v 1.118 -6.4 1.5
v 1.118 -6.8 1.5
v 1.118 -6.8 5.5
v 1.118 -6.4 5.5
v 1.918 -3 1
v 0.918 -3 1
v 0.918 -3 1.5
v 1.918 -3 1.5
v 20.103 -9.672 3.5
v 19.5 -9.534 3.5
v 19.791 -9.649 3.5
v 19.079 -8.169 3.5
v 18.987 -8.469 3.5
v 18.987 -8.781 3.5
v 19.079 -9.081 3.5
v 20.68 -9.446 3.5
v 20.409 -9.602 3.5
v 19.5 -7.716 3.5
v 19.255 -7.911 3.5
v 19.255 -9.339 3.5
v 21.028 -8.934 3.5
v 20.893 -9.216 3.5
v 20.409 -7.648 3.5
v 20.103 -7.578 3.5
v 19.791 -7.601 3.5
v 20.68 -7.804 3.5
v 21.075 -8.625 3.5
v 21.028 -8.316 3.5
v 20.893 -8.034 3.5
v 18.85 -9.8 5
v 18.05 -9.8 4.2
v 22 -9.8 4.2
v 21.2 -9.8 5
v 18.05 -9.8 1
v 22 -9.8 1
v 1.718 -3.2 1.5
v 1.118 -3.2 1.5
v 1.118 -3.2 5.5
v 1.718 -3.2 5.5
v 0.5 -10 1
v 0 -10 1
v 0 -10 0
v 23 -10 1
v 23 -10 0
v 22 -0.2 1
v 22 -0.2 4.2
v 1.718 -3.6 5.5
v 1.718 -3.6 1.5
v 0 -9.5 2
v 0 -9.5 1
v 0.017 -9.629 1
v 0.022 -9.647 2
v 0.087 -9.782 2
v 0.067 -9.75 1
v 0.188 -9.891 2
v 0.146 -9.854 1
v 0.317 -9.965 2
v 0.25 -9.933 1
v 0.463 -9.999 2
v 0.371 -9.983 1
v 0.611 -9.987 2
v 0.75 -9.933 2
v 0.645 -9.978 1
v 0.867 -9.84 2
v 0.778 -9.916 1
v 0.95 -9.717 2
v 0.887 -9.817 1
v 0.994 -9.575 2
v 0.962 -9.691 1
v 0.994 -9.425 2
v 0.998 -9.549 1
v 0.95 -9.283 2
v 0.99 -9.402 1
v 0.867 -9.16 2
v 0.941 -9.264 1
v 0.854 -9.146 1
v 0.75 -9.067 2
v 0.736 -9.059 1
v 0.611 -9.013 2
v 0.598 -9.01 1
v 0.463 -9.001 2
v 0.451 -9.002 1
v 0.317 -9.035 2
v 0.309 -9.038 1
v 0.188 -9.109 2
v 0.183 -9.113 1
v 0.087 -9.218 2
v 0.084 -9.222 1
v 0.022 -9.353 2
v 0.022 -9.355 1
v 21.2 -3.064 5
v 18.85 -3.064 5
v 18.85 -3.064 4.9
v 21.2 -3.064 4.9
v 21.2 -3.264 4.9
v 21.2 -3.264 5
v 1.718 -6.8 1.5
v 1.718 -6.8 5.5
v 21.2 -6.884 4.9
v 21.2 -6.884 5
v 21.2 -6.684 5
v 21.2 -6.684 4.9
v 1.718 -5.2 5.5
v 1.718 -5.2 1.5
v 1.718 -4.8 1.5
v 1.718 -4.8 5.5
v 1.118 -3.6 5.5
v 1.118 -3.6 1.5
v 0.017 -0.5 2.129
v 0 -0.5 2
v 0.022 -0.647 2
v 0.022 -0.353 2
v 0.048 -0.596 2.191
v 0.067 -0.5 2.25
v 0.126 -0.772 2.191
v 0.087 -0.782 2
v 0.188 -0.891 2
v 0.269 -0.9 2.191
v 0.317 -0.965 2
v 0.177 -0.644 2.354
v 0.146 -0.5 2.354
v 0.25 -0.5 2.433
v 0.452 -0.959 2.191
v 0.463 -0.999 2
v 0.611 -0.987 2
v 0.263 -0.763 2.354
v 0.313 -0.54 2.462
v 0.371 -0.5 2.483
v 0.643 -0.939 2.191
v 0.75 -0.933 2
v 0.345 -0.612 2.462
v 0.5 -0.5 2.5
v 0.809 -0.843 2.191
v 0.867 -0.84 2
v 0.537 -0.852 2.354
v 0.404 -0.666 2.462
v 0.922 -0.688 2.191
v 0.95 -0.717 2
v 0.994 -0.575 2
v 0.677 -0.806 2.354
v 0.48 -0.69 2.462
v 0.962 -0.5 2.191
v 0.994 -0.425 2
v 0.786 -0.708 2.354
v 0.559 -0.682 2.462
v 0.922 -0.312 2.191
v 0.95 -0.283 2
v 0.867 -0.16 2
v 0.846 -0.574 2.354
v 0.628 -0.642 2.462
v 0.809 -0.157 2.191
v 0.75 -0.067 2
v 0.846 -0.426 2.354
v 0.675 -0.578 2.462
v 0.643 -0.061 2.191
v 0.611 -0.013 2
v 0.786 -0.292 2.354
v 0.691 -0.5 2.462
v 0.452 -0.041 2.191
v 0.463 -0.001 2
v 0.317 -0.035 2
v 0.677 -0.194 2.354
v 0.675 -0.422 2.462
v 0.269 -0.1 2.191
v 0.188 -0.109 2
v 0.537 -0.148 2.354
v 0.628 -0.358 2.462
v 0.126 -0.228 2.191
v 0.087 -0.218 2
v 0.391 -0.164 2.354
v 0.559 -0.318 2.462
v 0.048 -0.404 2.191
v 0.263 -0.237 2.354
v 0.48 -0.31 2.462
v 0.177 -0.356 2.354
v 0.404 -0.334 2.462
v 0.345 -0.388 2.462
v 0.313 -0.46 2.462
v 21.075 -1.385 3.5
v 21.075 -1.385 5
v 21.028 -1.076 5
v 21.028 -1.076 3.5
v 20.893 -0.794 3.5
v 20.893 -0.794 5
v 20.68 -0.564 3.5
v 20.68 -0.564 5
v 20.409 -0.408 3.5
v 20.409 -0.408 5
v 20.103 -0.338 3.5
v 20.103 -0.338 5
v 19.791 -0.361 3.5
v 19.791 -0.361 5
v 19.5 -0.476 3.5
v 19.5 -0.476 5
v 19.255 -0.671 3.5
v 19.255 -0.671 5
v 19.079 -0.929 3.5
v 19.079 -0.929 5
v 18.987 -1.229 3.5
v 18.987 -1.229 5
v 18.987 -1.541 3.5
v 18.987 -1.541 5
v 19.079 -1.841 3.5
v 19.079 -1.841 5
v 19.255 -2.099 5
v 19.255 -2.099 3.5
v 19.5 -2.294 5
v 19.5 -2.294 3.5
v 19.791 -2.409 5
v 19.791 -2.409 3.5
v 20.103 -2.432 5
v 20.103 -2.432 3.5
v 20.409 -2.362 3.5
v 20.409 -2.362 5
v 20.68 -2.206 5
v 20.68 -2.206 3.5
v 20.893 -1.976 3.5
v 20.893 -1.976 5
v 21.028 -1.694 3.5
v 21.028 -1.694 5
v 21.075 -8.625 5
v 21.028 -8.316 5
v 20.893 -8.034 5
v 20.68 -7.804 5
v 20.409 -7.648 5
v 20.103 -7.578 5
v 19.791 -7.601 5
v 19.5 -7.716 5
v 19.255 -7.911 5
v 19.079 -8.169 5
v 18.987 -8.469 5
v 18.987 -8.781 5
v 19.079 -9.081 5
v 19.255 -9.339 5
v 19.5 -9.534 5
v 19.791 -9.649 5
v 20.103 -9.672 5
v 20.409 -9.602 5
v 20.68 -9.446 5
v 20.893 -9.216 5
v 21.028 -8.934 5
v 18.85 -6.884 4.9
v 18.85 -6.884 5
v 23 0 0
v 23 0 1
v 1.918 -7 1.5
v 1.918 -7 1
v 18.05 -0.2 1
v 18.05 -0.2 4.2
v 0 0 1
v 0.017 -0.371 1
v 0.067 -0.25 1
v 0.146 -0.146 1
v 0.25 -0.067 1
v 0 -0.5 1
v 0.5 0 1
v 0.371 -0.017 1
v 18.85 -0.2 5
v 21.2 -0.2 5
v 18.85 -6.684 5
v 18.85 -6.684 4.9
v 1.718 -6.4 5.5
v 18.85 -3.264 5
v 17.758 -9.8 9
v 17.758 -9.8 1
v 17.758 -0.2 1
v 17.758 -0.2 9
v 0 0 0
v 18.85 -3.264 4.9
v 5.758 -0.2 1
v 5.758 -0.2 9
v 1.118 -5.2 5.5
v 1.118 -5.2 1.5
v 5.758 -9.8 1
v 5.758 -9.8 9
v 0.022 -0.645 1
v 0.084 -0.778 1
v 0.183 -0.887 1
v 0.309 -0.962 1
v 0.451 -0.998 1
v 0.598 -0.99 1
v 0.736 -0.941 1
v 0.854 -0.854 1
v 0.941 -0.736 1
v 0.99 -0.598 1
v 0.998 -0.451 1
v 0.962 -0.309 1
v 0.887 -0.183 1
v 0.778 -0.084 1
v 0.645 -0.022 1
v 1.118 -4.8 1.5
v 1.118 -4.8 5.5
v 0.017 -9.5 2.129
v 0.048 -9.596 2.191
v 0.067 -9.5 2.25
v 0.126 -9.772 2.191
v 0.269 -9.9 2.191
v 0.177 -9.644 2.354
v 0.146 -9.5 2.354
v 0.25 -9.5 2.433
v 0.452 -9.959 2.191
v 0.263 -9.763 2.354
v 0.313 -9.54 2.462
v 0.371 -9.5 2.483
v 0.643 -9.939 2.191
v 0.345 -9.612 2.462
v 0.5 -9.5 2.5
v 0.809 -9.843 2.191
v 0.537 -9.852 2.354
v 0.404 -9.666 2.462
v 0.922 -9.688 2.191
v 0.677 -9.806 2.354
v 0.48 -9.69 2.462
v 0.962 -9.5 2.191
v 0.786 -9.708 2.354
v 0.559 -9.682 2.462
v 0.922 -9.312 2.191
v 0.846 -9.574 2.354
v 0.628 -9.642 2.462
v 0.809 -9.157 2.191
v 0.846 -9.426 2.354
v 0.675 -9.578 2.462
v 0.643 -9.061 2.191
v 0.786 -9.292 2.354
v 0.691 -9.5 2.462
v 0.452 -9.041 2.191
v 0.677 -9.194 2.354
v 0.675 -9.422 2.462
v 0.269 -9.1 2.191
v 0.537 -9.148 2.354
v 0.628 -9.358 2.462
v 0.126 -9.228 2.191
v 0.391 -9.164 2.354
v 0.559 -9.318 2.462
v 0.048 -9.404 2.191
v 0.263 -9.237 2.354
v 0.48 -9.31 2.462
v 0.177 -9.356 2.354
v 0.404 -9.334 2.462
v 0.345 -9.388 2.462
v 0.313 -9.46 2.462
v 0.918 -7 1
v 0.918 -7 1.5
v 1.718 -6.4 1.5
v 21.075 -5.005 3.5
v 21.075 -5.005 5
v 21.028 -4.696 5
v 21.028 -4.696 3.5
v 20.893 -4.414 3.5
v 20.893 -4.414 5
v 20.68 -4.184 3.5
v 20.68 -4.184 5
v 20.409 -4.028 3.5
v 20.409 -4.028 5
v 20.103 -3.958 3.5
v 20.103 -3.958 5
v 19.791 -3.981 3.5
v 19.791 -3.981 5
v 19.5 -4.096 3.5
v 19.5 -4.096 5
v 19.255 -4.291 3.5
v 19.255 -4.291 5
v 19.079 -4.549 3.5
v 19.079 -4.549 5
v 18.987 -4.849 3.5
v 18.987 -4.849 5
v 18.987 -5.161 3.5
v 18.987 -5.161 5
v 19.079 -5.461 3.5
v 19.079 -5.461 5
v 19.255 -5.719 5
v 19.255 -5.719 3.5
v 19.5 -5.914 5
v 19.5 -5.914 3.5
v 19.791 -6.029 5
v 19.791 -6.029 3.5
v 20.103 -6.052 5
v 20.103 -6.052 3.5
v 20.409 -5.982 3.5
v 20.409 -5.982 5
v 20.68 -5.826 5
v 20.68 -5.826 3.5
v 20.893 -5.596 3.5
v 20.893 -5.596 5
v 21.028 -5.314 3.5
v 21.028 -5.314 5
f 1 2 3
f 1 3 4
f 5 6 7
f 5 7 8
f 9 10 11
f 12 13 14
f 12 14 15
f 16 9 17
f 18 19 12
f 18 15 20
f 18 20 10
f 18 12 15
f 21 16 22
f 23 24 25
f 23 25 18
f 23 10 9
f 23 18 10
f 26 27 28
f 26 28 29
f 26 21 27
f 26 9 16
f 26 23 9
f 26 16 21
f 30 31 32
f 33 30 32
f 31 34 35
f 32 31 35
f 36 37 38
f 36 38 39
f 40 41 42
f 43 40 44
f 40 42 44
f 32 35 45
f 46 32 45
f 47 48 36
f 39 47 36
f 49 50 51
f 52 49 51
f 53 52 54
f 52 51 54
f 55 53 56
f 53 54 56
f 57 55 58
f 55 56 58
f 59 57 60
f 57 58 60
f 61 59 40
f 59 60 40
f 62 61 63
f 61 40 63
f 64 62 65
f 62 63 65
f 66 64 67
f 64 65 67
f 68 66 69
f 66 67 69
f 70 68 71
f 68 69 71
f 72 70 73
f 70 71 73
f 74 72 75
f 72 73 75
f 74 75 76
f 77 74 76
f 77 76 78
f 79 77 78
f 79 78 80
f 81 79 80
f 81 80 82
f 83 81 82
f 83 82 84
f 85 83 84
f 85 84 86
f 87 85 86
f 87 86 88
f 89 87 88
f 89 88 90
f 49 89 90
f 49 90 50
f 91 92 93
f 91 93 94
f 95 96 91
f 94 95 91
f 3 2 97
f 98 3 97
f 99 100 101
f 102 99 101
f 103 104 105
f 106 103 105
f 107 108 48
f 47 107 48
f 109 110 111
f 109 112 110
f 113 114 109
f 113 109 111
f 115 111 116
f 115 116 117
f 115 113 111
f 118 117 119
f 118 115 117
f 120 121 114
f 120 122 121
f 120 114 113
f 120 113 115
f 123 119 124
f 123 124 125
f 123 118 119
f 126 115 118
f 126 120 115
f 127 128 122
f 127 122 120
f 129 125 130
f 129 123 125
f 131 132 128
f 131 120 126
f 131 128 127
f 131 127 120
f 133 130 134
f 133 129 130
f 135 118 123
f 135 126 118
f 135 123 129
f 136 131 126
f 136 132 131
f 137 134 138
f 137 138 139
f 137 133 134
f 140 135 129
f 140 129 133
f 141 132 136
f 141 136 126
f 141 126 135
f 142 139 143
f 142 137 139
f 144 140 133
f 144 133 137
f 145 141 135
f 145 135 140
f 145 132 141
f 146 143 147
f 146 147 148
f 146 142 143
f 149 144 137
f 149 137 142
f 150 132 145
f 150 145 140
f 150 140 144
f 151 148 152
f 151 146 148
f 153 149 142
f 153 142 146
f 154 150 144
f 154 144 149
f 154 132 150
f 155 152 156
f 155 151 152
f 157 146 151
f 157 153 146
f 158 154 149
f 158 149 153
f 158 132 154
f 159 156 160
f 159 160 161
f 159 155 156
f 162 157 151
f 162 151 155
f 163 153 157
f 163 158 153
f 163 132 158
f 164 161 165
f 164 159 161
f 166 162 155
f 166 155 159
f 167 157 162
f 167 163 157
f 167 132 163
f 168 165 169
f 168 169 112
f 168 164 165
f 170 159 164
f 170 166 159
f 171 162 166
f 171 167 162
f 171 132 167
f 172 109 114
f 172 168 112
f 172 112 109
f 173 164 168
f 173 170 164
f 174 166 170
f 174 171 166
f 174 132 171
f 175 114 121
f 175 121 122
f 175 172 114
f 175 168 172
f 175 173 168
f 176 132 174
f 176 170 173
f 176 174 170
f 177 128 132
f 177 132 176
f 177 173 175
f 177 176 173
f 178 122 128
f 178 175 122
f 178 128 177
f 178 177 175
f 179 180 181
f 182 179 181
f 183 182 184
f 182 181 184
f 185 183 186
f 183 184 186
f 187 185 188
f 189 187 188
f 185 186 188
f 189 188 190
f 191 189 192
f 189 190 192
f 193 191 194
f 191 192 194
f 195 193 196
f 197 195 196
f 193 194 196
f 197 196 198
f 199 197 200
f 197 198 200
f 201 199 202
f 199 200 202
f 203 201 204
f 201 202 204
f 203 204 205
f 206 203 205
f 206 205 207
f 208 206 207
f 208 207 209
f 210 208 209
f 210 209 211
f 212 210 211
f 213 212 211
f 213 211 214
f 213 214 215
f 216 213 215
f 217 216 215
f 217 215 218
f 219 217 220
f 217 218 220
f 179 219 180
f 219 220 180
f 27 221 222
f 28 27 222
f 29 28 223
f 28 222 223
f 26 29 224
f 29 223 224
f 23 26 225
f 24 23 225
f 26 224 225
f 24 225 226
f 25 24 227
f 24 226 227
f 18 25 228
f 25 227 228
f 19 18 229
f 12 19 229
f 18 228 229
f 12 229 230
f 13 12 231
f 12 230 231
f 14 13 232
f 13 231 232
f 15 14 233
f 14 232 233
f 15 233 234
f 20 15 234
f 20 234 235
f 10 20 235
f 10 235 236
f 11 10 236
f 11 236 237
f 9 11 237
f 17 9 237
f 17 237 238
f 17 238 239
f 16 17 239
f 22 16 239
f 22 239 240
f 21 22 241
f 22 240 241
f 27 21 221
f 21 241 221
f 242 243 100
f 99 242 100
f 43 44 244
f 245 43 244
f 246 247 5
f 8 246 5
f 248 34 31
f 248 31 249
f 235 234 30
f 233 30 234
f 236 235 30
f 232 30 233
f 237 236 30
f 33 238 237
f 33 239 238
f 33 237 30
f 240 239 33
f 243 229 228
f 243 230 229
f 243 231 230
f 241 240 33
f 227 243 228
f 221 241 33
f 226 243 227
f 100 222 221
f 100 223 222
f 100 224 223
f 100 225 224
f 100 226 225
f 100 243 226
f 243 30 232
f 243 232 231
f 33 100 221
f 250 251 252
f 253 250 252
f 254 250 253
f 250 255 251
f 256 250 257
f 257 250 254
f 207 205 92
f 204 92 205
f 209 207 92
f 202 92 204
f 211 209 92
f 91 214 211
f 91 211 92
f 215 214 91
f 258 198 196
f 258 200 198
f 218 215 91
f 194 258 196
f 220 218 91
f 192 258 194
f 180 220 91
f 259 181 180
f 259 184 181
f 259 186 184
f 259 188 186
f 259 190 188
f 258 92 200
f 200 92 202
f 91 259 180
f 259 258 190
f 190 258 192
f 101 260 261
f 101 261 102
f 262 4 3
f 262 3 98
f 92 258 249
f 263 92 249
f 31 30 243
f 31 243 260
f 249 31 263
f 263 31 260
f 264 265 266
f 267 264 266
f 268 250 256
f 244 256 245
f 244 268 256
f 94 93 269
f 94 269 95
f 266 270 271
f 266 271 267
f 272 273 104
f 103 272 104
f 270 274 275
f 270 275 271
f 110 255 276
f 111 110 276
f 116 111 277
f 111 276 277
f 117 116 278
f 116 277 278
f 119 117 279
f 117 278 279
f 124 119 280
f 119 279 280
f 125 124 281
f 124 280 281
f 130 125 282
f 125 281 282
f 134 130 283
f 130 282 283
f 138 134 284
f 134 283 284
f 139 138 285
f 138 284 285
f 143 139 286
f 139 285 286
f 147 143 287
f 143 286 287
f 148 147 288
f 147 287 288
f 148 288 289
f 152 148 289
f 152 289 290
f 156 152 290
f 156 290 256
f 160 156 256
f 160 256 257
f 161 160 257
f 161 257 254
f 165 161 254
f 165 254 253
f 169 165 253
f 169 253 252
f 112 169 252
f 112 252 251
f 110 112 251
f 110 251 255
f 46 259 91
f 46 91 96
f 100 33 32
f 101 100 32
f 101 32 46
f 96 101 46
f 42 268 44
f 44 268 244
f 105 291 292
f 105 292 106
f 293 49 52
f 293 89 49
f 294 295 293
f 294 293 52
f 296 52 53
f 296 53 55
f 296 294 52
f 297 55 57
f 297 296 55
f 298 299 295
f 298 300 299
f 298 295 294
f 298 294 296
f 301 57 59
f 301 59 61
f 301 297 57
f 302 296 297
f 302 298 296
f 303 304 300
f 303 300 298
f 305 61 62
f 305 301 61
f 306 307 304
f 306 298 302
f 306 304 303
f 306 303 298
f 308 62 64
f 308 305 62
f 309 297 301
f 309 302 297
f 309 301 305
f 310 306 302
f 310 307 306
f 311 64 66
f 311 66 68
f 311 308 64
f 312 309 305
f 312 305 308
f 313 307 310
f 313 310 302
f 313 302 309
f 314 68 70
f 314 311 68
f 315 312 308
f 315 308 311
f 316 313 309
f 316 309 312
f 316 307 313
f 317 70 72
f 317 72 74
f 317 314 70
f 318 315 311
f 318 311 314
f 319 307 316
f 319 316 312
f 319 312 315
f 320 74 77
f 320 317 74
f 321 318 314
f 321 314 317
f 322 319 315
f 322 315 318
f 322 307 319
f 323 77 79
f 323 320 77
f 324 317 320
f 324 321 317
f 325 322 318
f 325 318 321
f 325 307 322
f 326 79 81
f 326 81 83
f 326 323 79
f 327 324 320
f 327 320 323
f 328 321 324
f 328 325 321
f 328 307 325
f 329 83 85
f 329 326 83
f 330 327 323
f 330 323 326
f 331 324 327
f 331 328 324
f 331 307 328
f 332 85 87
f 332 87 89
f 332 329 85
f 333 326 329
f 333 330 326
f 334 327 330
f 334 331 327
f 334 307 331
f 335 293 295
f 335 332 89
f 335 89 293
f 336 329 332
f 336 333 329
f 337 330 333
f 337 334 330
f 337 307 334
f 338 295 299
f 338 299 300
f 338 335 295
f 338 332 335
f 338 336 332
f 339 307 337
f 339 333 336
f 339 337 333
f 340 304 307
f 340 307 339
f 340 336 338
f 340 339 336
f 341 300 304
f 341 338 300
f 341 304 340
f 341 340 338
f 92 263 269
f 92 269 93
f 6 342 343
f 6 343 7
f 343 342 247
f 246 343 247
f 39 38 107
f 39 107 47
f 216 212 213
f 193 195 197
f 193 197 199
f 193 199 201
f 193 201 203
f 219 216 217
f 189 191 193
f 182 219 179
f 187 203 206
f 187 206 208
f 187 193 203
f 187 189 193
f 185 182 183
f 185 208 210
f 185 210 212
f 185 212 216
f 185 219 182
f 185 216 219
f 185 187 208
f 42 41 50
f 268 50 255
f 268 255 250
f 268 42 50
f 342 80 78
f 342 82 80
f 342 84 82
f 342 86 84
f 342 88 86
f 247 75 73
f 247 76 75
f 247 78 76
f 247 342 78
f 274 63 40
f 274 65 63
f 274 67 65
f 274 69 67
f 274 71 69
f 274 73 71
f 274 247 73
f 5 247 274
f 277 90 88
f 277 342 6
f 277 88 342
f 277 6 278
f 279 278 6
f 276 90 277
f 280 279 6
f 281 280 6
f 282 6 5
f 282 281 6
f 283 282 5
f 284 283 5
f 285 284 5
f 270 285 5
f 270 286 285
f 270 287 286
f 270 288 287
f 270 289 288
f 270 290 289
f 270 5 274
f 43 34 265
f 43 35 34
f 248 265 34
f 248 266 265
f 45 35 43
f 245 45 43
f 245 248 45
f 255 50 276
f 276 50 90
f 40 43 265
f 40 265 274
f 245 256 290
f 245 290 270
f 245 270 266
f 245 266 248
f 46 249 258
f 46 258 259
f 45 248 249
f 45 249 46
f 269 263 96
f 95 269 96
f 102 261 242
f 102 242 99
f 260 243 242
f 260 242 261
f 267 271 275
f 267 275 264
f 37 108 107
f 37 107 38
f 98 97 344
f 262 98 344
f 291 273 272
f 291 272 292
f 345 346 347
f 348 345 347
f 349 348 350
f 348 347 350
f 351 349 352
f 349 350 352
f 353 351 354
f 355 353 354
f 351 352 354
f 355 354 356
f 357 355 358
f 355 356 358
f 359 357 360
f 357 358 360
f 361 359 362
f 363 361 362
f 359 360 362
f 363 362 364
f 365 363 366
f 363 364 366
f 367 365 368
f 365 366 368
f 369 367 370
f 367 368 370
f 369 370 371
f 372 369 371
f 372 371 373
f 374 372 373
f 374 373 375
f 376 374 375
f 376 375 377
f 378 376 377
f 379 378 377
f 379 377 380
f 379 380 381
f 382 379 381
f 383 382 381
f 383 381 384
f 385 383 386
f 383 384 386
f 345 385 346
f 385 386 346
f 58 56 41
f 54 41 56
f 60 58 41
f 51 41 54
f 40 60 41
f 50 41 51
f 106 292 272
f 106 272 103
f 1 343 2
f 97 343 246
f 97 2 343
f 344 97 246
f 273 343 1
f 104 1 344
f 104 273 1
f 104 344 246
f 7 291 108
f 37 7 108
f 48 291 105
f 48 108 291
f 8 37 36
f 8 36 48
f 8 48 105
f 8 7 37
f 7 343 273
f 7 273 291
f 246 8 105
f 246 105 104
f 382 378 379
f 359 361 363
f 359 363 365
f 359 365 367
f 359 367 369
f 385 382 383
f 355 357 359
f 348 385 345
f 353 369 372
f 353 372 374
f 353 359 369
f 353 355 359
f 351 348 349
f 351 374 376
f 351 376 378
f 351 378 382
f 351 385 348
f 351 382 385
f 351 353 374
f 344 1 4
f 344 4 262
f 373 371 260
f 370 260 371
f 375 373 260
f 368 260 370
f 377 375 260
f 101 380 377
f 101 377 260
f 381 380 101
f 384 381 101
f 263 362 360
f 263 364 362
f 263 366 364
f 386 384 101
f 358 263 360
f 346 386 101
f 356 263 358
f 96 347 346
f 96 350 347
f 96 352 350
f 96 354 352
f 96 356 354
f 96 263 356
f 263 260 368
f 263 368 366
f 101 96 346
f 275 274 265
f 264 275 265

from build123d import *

# Parameters (mm, degrees)
SKETCH1_W           = 23
SKETCH1_H           = 10
BOSS_EXTRUDE1_DEPTH = 1
SKETCH2_W           = 3.95
SKETCH2_H           = 9.6
BOSS_EXTRUDE2_DEPTH = 4
SKETCH5_W           = 12
SKETCH5_H           = 9.6
BOSS_EXTRUDE3_DEPTH = 8
CUT_EXTRUDE1_REACH  = 28.571
SKETCH7_R           = 1.05
CUT_EXTRUDE3_DEPTH  = 1.5
SKETCH9_W           = 2.35
SKETCH9_H           = 0.2
CUT_EXTRUDE4_DEPTH  = 0.1
SKETCH10_W          = 1
SKETCH10_H          = 4
BOSS_EXTRUDE4_DEPTH = 0.5
SKETCH11_W          = 0.6
SKETCH11_H          = 0.4
BOSS_EXTRUDE5_DEPTH = 4
SKETCH12_R          = 0.5
BOSS_EXTRUDE6_DEPTH = 1.5
FILLET3_R           = 0.5


with BuildPart() as part:
    # Sketch1 → Boss-Extrude1 (new body)
    with BuildSketch(Plane.XY):
        with Locations((11.5, -5)):
            Rectangle(SKETCH1_W, SKETCH1_H)
    extrude(amount=BOSS_EXTRUDE1_DEPTH)

    # Sketch2 → Boss-Extrude2 (add)
    with BuildSketch(Plane.XY.offset(1)):
        with Locations((20.025, -5)):
            Rectangle(SKETCH2_W, SKETCH2_H)
    extrude(amount=BOSS_EXTRUDE2_DEPTH)

    # Sketch5 → Boss-Extrude3 (add)
    with BuildSketch(Plane.XY.offset(1)):
        with Locations((11.757840523, -5)):
            Rectangle(SKETCH5_W, SKETCH5_H)
    extrude(amount=BOSS_EXTRUDE3_DEPTH)

    # Sketch6 → Cut-Extrude1 (cut, up to next)
    with BuildSketch(Plane.XZ.offset(9.8), mode=Mode.PRIVATE) as cut_extrude1_sk1:
        Polygon((21.2, 5), (22, 4.2), (22, 5), align=None)
    cut_extrude1_tool1 = extrude(cut_extrude1_sk1.sketch, amount=-CUT_EXTRUDE1_REACH, mode=Mode.PRIVATE) & part.part
    # Sketch6 → Cut-Extrude1 (cut, up to next)
    with BuildSketch(Plane.XZ.offset(9.8), mode=Mode.PRIVATE) as cut_extrude1_sk2:
        Polygon((18.05, 5), (18.85, 5), (18.05, 4.2), align=None)
    cut_extrude1_tool2 = extrude(cut_extrude1_sk2.sketch, amount=-CUT_EXTRUDE1_REACH, mode=Mode.PRIVATE) & part.part
    add(cut_extrude1_tool1.solids().sort_by_distance((21.733333, -9.8, 4.733333))[0], mode=Mode.SUBTRACT)
    add(cut_extrude1_tool2.solids().sort_by_distance((18.316667, -9.8, 4.733333))[0], mode=Mode.SUBTRACT)

    # Sketch7 → Cut-Extrude3 (cut)
    with BuildSketch(Plane.XY.offset(5)):
        with Locations((20.025, -8.625)):
            Circle(SKETCH7_R)
        with Locations((20.025, -5.005)):
            Circle(SKETCH7_R)
        with Locations((20.025, -1.385)):
            Circle(SKETCH7_R)
    extrude(amount=-CUT_EXTRUDE3_DEPTH, mode=Mode.SUBTRACT)

    # Sketch9 → Cut-Extrude4 (cut)
    with BuildSketch(Plane.XY.offset(5)):
        with Locations((20.025, -6.783672737)):
            Rectangle(SKETCH9_W, SKETCH9_H)
        with Locations((20.025, -3.163989789)):
            Rectangle(SKETCH9_W, SKETCH9_H)
    extrude(amount=-CUT_EXTRUDE4_DEPTH, mode=Mode.SUBTRACT)

    # Sketch10 → Boss-Extrude4 (add)
    with BuildSketch(Plane.XY.offset(1)):
        with Locations((1.418300491, -5)):
            Rectangle(SKETCH10_W, SKETCH10_H)
    extrude(amount=BOSS_EXTRUDE4_DEPTH)

    # Sketch11 → Boss-Extrude5 (add)
    with BuildSketch(Plane.XY.offset(1.5)):
        with Locations((1.418300491, -5)):
            Rectangle(SKETCH11_W, SKETCH11_H)
        with Locations((1.418300491, -3.4)):
            Rectangle(SKETCH11_W, SKETCH11_H)
        with Locations((1.418300491, -6.6)):
            Rectangle(SKETCH11_W, SKETCH11_H)
    extrude(amount=BOSS_EXTRUDE5_DEPTH)

    # Sketch12 → Boss-Extrude6 (add)
    with BuildSketch(Plane.XY.offset(1)):
        with Locations(Location((0.5, -9.5, 0), (0, 0, 180))):
            Circle(SKETCH12_R)
        with Locations(Location((0.5, -0.5, 0), (0, 0, 180))):
            Circle(SKETCH12_R)
    extrude(amount=BOSS_EXTRUDE6_DEPTH)

    # Fillet3
    fillet3_edges = [part.edges().sort_by_distance(p)[0] for p in [
        (1, -0.5, 2.5),
        (1, -9.5, 2.5),
    ]]
    fillet(fillet3_edges, radius=FILLET3_R)


solid = part.part
